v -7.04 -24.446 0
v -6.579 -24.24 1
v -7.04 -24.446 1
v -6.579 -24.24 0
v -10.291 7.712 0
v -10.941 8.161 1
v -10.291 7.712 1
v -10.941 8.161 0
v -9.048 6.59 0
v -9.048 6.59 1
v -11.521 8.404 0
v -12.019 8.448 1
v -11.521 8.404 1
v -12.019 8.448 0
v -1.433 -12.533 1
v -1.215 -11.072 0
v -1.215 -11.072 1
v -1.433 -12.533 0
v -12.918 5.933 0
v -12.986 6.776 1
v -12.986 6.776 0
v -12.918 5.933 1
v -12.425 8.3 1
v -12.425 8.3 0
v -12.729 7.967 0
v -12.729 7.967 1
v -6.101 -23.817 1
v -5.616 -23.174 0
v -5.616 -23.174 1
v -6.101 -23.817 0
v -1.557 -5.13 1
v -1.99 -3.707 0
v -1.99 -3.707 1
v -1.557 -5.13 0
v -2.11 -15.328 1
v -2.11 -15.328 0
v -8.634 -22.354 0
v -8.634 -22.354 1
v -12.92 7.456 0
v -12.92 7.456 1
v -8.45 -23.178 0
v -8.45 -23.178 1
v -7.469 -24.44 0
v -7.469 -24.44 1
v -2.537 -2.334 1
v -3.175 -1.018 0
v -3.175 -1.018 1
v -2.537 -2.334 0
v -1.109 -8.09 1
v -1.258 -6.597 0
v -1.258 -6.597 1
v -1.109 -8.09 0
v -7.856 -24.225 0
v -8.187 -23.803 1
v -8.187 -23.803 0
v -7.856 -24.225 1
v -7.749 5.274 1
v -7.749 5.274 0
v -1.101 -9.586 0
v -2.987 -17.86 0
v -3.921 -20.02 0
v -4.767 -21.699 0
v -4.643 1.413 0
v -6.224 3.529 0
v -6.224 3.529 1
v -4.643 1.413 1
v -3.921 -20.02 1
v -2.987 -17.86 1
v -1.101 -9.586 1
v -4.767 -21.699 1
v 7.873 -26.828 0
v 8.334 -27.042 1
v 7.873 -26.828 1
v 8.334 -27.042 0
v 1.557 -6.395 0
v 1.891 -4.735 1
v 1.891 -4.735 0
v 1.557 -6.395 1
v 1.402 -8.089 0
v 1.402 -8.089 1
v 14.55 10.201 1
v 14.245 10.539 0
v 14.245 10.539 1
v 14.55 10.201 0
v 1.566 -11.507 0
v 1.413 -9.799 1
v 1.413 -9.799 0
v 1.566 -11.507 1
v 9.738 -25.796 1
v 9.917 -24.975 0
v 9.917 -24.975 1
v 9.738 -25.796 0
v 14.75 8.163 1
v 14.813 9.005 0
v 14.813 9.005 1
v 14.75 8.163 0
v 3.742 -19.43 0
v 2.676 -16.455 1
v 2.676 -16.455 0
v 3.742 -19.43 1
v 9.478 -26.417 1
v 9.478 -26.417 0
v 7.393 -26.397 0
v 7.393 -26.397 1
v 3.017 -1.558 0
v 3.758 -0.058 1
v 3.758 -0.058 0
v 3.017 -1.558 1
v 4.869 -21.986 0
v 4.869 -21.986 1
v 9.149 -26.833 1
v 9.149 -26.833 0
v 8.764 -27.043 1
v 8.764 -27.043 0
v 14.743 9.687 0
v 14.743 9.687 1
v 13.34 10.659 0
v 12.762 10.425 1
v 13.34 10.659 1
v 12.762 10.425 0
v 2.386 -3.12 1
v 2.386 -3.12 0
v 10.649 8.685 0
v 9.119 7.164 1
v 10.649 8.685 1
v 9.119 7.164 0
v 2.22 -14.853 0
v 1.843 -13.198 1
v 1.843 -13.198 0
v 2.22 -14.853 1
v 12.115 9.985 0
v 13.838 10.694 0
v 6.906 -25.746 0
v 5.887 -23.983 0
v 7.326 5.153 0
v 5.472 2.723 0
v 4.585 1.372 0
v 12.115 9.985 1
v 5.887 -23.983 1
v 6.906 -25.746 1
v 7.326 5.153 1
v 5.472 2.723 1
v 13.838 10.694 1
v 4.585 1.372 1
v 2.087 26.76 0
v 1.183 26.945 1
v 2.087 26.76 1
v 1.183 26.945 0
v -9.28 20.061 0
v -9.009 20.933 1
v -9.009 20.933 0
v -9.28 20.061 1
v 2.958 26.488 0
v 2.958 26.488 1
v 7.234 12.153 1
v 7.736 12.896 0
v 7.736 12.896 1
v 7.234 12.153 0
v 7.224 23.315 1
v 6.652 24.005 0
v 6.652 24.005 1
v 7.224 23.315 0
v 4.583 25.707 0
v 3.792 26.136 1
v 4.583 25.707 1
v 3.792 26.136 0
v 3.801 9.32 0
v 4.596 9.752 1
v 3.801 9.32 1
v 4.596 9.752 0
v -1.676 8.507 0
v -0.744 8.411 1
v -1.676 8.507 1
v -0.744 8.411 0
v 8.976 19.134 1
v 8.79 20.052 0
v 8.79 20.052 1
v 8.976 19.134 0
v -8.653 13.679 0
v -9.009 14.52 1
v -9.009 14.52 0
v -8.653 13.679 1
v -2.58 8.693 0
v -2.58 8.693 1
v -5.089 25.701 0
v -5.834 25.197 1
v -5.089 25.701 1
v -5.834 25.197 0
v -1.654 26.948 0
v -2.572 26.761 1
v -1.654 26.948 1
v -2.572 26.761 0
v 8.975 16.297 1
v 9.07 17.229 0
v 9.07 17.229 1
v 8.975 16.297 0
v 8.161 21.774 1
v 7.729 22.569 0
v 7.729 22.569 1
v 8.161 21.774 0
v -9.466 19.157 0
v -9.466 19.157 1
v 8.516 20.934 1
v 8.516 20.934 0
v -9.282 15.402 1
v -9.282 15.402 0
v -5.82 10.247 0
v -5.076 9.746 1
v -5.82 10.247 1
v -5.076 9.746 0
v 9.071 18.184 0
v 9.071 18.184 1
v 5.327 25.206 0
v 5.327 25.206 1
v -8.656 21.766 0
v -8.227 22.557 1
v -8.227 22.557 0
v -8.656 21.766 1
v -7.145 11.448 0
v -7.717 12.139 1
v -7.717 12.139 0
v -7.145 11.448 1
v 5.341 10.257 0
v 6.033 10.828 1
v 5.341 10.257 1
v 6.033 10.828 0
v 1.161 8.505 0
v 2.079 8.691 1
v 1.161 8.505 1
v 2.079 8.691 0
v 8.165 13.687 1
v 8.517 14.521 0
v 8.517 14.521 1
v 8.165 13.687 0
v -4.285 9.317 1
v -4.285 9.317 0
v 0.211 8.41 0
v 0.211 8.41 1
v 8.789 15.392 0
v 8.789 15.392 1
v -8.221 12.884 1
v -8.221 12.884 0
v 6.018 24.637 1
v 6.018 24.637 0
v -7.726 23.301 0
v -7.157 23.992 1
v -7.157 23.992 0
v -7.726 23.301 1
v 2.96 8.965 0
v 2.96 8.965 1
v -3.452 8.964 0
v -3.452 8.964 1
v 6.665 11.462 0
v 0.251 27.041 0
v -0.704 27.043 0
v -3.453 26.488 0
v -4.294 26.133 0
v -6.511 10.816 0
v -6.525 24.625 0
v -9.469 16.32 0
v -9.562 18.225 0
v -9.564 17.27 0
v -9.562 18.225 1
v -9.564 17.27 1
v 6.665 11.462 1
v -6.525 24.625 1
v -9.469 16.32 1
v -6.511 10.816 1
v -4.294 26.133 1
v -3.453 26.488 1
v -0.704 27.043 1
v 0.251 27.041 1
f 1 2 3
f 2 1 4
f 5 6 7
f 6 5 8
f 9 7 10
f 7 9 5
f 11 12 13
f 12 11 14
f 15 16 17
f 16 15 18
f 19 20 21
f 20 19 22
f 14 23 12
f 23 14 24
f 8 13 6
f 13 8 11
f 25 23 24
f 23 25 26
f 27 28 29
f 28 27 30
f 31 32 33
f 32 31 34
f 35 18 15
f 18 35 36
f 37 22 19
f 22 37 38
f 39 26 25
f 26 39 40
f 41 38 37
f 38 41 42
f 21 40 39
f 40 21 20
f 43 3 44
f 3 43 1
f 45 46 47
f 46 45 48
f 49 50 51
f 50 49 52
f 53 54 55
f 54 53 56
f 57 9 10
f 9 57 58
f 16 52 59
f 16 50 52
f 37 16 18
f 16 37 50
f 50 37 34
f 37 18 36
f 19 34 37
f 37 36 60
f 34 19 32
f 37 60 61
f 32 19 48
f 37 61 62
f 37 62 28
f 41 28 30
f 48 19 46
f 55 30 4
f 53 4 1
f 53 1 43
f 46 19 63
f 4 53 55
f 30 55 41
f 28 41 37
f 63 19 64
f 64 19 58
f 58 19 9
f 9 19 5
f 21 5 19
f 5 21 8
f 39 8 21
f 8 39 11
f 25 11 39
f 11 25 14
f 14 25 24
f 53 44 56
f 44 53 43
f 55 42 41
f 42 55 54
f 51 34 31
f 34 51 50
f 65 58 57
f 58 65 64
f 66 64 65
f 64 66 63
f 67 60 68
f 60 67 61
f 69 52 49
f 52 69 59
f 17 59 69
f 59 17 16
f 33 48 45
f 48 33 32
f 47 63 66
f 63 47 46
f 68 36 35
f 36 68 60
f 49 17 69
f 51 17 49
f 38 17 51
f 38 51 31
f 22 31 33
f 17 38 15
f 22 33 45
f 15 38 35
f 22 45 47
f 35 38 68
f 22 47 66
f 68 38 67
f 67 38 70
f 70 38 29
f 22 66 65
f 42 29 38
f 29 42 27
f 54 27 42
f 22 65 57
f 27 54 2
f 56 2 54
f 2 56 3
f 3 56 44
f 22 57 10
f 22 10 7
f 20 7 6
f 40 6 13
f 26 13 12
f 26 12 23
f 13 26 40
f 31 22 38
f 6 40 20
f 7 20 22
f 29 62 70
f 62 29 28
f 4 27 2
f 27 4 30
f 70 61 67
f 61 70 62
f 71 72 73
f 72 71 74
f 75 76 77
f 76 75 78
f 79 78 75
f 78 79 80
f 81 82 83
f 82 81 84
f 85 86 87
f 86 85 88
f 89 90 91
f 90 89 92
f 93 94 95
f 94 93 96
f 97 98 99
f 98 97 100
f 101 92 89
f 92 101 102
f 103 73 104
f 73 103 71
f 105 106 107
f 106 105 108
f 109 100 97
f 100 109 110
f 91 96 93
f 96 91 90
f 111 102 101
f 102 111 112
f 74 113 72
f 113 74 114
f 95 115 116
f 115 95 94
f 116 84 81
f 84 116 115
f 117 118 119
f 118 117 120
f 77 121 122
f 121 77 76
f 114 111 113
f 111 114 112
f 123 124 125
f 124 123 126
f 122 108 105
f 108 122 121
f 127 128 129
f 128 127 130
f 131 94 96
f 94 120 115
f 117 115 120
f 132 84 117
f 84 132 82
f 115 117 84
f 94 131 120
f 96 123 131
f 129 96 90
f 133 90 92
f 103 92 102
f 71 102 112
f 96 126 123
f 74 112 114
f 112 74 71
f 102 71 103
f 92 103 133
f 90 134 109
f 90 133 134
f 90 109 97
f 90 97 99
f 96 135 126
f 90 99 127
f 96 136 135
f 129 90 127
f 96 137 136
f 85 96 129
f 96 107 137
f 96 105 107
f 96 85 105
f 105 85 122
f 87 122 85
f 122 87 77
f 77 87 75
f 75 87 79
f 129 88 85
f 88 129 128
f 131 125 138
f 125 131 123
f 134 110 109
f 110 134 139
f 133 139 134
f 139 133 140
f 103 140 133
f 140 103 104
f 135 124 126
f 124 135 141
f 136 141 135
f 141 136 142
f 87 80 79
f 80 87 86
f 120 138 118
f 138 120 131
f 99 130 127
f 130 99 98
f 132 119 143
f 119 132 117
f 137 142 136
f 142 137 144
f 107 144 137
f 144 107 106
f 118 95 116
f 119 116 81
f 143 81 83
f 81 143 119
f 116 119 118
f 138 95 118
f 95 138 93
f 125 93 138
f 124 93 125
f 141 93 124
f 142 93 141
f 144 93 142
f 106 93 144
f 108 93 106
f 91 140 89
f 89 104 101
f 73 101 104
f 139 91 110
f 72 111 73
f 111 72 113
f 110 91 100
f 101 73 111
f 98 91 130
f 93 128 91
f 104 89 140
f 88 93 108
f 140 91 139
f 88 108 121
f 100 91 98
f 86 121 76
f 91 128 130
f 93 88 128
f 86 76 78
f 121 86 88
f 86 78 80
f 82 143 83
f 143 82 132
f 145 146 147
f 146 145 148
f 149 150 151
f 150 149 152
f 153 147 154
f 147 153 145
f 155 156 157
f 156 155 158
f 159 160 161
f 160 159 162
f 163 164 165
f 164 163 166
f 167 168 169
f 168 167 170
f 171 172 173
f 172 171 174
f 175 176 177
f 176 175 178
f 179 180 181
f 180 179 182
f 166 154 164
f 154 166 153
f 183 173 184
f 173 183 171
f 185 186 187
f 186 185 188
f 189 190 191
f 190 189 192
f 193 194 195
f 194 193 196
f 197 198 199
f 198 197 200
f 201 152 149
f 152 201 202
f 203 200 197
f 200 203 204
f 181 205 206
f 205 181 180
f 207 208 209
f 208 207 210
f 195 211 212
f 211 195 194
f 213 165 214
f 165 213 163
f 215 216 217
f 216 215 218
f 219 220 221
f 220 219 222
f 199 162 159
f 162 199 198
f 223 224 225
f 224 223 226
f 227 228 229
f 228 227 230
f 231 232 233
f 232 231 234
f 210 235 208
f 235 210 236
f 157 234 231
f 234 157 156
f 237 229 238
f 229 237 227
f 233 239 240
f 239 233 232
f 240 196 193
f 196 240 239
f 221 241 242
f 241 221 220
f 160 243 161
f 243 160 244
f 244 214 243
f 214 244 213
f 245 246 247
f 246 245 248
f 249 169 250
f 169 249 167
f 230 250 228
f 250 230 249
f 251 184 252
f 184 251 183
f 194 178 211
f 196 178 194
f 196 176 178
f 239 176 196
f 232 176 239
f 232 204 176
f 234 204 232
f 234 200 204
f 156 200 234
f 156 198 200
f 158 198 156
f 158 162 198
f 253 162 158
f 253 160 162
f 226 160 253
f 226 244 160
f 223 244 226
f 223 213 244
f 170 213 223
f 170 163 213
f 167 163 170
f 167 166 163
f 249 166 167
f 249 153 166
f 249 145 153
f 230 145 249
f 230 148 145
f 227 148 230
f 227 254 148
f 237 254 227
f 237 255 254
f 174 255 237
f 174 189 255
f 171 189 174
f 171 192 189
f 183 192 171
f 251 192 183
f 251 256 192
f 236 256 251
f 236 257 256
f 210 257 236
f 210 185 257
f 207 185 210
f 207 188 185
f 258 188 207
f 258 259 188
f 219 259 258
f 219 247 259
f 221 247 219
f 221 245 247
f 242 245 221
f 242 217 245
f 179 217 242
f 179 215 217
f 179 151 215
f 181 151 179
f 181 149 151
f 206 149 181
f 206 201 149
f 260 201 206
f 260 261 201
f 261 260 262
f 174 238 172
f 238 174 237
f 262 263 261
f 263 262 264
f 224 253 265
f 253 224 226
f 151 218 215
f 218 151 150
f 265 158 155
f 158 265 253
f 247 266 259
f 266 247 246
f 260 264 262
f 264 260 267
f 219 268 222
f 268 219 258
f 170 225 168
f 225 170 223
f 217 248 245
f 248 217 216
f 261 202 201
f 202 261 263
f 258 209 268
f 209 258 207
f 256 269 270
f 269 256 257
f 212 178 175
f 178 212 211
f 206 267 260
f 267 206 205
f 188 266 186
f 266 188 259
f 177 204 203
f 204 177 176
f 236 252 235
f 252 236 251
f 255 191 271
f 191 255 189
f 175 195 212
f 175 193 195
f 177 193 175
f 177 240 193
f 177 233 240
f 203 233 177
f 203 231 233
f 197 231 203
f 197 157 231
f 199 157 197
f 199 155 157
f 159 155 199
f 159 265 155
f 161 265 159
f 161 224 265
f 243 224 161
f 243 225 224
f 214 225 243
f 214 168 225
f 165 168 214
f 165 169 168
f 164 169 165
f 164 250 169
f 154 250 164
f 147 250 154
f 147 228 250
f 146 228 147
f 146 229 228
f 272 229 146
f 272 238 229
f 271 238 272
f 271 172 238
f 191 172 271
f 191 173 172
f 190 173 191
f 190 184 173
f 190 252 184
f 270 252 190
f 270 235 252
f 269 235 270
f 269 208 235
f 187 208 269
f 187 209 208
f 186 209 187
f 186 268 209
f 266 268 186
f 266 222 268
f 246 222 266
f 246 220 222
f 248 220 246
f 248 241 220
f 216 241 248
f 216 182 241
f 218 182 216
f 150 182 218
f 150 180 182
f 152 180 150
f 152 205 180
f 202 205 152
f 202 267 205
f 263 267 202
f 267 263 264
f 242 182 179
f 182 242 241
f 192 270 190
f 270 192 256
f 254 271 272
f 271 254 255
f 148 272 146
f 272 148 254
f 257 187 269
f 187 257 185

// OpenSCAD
// Module names are of the form poly_<inkscape-path-id>().  As a result,
// you can associate a polygon in this OpenSCAD program with the corresponding
// SVG element in the Inkscape document by looking for the XML element with
// the attribute id="inkscape-path-id".

// fudge value is used to ensure that subtracted solids are a tad taller
// in the z dimension than the polygon being subtracted from.  This helps
// keep the resulting .stl file manifold.
fudge = 0.1;

module bonhomme_left_leg(h)
{
  scale([25.4/90, -25.4/90, 1]) union()
  {
    linear_extrude(height=h)
      polygon([[-263.117170,23.375013],[-262.590483,28.665977],[-262.561017,33.967672],[-262.964851,39.231517],[-263.738067,44.408931],[-266.136971,54.310137],[-269.246377,63.282642],[-272.554934,70.937796],[-275.551290,76.886948],[-278.561997,82.112650],[-280.278621,84.389373],[-281.974318,85.888191],[-283.605224,86.620922],[-285.127475,86.599383],[-286.497211,85.835393],[-287.670566,84.340769],[-288.603679,82.127330],[-289.252687,79.206892],[-304.433848,-21.021389],[-304.675099,-24.008778],[-304.439370,-26.419739],[-303.764438,-28.228278],[-302.688083,-29.408403],[-301.248083,-29.934120],[-299.482218,-29.779437],[-297.428265,-28.918362],[-295.124005,-27.324901],[-290.721154,-23.351271],[-286.118499,-18.686065],[-280.715833,-12.503562],[-275.113761,-5.004981],[-269.912889,3.608456],[-267.650593,8.270364],[-265.713824,13.135528],[-264.177658,18.178795],[-263.117170,23.375013]]);
  }
}

module bonhomme_right_leg(h)
{
  scale([25.4/90, -25.4/90, 1]) union()
  {
    linear_extrude(height=h)
      polygon([[-253.144085,22.660125],[-251.961095,16.778968],[-250.207540,11.055503],[-247.972681,5.520327],[-245.345775,0.204035],[-242.416081,-4.862777],[-239.272859,-9.649513],[-232.702863,-18.260375],[-226.349856,-25.383785],[-220.927907,-30.774979],[-215.733464,-35.381653],[-213.440862,-36.938801],[-211.393599,-37.766875],[-209.629836,-37.892635],[-208.187734,-37.342836],[-207.105454,-36.144236],[-206.421157,-34.323592],[-206.173005,-31.907663],[-206.399157,-28.923204],[-223.523833,88.494990],[-224.156632,91.404831],[-225.077710,93.603214],[-226.243044,95.078959],[-227.608612,95.820885],[-229.130391,95.817811],[-230.764360,95.058557],[-232.466496,93.531941],[-234.192778,91.226783],[-237.803740,84.977891],[-241.407503,77.902123],[-245.401286,68.847143],[-249.178462,58.304201],[-250.796251,52.628261],[-252.132404,46.764550],[-253.111093,40.774475],[-253.656488,34.719441],[-253.692761,28.660856],[-253.144085,22.660125]]);
  }
}

module bonhomme_head(h)
{
  scale([25.4/90, -25.4/90, 1]) union()
  {
    linear_extrude(height=h)
      polygon([[-226.519292,-64.431083],[-226.854957,-67.798222],[-227.515975,-71.051499],[-228.484885,-74.175162],[-229.744227,-77.153460],[-231.276541,-79.970640],[-233.064368,-82.610952],[-235.090247,-85.058643],[-237.336719,-87.297961],[-239.786323,-89.313155],[-242.421599,-91.088474],[-245.225089,-92.608164],[-248.179331,-93.856474],[-251.266866,-94.817654],[-254.470234,-95.475950],[-257.771974,-95.815611],[-261.154628,-95.820885],[-264.520902,-95.484953],[-267.773605,-94.824107],[-270.896957,-93.855734],[-273.875179,-92.597225],[-276.692490,-91.065965],[-279.333112,-89.279345],[-281.781264,-87.254752],[-284.021167,-85.009575],[-286.037041,-82.561201],[-287.813107,-79.927019],[-289.333585,-77.124418],[-290.582695,-74.170785],[-291.544658,-71.083509],[-292.203694,-67.879977],[-292.544024,-64.577580],[-292.549867,-61.193704],[-292.213365,-57.826504],[-291.551846,-54.573054],[-290.582721,-51.449123],[-289.323403,-48.470477],[-287.791304,-45.652885],[-286.003836,-43.012114],[-283.978410,-40.563932],[-281.732440,-38.324107],[-279.283338,-36.308406],[-276.648515,-34.532597],[-273.845384,-33.012447],[-270.891357,-31.763725],[-267.803846,-30.802198],[-264.600263,-30.143634],[-261.298021,-29.803800],[-257.914531,-29.798465],[-254.549003,-30.134876],[-251.296557,-30.796146],[-248.173056,-31.764894],[-245.194362,-33.023739],[-242.376340,-34.555303],[-239.734853,-36.342203],[-237.285763,-38.367060],[-235.044934,-40.612494],[-233.028230,-43.061124],[-231.251513,-45.695570],[-229.730646,-48.498451],[-228.481494,-51.452388],[-227.519920,-54.540000],[-226.861785,-57.743907],[-226.522955,-61.046728],[-226.519292,-64.431083]]);
  }
}

module InteleradLogo(h)
{
    translate([73, 0, 0]) {
        bonhomme_left_leg(h);
        bonhomme_right_leg(h);
        bonhomme_head(h);
    }
}

InteleradLogo(1);
